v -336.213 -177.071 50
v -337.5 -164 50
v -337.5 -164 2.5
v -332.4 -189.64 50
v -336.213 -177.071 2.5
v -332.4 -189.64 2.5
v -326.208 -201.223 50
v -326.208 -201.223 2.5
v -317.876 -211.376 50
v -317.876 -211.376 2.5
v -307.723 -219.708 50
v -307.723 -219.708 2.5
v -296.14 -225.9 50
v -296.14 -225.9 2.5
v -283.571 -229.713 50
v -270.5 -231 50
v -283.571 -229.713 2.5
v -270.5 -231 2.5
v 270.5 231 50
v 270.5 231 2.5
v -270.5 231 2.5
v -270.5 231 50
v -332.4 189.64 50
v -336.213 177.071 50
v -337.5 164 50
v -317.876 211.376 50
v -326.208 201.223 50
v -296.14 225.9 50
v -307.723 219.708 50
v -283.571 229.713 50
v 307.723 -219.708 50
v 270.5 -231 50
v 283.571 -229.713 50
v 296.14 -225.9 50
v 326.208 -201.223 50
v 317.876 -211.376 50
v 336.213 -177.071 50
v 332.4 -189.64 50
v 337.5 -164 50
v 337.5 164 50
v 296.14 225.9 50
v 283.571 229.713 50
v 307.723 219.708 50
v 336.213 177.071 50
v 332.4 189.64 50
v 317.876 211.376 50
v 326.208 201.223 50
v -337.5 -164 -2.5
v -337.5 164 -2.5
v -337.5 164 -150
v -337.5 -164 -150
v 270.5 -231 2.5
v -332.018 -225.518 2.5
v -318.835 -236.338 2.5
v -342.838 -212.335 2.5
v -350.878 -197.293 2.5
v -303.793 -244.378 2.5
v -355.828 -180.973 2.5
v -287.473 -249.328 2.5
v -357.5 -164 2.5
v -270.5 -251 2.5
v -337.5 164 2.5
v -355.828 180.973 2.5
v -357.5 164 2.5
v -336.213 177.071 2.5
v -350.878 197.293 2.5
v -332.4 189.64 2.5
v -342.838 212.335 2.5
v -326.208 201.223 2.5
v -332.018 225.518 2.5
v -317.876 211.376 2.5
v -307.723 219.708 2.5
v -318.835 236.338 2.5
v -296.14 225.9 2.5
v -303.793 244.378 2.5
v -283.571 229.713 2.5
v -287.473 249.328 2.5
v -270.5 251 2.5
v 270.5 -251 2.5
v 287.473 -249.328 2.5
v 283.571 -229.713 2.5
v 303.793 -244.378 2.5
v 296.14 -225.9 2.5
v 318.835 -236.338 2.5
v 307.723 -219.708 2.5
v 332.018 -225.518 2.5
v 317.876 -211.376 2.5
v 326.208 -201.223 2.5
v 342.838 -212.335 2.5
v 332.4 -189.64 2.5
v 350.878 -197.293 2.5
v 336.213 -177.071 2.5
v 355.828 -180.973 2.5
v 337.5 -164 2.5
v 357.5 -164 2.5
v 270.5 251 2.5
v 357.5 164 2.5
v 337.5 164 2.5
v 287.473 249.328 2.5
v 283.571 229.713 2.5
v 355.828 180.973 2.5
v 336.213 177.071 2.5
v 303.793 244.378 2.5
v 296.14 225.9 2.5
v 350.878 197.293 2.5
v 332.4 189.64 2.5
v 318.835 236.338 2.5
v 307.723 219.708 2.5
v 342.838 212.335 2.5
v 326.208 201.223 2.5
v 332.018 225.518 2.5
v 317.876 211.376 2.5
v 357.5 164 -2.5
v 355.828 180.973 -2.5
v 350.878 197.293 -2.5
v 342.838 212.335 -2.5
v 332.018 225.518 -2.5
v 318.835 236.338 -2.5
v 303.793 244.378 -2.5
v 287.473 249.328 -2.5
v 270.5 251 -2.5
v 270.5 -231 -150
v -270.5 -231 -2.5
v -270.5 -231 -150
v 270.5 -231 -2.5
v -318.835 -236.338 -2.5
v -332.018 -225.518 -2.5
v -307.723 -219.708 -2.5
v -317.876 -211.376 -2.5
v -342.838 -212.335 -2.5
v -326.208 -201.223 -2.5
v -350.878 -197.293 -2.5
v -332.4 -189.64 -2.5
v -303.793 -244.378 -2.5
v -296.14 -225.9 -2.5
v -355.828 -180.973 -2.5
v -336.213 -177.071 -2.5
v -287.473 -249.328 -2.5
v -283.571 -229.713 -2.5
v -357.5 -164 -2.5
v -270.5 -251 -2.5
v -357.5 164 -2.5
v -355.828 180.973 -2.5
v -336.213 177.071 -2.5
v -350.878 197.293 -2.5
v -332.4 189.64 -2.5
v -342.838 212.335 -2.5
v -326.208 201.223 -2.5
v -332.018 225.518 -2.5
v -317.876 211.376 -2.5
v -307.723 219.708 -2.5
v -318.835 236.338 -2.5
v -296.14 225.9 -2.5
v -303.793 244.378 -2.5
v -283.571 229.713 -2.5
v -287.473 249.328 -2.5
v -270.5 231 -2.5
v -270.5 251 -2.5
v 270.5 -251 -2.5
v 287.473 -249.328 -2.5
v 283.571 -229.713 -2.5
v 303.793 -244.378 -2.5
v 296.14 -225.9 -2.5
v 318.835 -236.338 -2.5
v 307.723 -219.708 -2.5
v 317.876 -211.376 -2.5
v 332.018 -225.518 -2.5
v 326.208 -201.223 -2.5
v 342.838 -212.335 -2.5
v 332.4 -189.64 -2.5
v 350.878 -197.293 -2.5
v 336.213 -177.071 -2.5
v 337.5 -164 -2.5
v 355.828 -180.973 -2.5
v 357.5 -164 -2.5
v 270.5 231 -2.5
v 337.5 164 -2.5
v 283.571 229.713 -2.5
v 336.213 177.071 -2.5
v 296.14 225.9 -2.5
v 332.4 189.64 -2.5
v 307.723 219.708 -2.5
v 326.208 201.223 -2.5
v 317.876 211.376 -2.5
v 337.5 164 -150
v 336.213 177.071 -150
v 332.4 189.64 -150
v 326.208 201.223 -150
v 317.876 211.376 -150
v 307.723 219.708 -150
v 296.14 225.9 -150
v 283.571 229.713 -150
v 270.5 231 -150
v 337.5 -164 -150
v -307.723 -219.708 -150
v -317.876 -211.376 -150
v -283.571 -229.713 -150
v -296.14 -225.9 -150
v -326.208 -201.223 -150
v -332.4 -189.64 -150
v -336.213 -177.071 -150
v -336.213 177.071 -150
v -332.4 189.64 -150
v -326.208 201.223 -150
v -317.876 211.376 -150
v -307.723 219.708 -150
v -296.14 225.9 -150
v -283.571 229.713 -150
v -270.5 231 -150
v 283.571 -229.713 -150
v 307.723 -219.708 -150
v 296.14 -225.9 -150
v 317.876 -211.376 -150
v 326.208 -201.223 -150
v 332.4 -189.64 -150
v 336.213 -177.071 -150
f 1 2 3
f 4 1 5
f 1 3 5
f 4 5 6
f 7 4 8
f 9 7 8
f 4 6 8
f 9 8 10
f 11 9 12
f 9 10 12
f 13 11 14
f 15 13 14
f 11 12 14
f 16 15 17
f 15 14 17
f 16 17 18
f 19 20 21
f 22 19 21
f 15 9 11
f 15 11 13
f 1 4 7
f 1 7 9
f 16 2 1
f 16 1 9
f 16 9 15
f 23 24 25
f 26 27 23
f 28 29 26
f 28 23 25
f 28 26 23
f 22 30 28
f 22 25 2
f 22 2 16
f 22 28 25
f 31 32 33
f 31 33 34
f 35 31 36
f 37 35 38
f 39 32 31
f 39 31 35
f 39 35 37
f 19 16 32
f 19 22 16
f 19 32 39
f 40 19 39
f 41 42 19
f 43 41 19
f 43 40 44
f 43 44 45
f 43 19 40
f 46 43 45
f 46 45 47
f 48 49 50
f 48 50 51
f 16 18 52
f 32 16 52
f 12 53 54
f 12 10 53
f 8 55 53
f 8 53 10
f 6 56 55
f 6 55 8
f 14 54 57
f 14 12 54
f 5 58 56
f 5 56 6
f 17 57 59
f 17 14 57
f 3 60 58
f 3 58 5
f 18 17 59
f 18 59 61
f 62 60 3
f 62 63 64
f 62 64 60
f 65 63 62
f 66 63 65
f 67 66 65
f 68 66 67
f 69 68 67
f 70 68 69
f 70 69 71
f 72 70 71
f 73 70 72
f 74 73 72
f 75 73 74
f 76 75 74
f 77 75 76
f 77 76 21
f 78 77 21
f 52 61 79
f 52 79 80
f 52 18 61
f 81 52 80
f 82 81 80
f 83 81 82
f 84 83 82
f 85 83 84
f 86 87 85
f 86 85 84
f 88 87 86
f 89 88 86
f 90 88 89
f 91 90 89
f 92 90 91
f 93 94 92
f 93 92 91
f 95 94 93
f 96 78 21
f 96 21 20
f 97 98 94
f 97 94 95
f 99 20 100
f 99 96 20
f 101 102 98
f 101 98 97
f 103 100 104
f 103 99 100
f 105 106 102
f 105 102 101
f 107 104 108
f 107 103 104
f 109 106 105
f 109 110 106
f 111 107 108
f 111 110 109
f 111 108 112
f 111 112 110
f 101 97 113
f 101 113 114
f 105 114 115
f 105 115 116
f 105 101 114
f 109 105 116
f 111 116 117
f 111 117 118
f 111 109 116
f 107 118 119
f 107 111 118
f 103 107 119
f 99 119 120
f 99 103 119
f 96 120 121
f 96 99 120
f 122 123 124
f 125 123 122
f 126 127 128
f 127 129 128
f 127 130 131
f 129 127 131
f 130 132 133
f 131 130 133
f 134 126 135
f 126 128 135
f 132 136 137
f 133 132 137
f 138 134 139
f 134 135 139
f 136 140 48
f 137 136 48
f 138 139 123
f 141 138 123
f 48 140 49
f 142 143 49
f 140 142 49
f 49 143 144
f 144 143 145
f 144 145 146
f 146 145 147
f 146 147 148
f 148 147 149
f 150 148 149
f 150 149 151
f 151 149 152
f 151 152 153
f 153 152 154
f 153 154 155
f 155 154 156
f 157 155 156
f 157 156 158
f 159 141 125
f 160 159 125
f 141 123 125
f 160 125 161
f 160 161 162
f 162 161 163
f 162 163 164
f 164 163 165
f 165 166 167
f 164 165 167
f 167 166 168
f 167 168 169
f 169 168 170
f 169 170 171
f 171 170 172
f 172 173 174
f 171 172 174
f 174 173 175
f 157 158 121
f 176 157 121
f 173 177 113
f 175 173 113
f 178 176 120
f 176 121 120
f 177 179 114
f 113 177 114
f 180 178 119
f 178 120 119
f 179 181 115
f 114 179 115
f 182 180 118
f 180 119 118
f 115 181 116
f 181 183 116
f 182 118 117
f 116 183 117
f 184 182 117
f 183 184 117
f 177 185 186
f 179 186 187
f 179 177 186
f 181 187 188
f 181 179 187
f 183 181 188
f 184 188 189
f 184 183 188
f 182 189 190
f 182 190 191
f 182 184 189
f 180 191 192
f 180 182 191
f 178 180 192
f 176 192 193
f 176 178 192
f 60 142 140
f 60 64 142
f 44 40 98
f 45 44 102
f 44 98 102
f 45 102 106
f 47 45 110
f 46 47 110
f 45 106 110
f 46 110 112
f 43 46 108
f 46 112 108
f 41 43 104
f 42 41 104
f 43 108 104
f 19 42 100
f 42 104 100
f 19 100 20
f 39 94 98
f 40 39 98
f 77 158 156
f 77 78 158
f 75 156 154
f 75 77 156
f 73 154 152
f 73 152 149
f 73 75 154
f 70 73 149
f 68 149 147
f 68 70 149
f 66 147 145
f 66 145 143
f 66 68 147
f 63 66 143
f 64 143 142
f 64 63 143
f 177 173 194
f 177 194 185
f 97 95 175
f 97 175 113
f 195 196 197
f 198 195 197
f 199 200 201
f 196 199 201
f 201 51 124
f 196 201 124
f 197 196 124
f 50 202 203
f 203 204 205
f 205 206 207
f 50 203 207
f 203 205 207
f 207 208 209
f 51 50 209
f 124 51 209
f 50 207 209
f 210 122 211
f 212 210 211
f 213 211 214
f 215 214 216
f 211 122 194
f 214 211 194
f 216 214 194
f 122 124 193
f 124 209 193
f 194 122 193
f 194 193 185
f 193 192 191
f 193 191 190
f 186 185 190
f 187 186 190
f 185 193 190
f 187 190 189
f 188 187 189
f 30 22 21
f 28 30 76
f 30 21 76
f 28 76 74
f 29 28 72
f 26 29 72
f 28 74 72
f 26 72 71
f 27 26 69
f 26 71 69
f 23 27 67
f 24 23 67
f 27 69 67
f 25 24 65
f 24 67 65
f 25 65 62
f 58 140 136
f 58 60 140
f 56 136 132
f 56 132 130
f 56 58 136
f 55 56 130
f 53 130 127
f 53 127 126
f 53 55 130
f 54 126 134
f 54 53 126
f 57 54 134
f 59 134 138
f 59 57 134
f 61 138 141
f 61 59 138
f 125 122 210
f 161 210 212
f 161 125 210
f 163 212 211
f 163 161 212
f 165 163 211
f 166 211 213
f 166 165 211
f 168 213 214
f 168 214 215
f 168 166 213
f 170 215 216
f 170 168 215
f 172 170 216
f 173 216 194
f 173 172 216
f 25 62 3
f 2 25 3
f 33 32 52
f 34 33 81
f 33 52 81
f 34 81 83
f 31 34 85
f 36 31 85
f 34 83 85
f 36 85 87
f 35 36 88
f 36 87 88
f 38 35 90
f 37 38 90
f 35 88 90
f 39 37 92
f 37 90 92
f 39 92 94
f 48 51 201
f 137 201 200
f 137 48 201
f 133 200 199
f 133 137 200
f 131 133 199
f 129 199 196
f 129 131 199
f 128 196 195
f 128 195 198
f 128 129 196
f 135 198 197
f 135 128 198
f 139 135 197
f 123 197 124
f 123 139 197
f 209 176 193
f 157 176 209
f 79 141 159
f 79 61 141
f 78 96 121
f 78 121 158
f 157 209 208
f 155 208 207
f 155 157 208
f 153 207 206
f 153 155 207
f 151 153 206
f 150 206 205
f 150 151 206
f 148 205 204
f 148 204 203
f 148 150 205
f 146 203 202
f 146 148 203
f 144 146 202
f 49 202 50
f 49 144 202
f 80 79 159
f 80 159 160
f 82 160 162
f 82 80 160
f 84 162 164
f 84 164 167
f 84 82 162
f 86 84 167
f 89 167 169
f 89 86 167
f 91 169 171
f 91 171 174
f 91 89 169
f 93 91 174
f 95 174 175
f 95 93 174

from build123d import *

# Parameters (mm, degrees)
F1_DEPTH = 2.5
F2_DEPTH = 50
F3_DEPTH = 150


with BuildPart() as f1:
    # F0 (on Top) → F1 (new body, symmetric)
    with BuildSketch(Plane.XY):
        with BuildLine():
            Line((-270.5, -251), (270.5, -251))
            ThreePointArc((270.5, -251), (332.01829, -225.51829), (357.5, -164))
            Line((357.5, -164), (357.5, 164))
            ThreePointArc((357.5, 164), (332.01829, 225.51829), (270.5, 251))
            Line((270.5, 251), (-270.5, 251))
            ThreePointArc((-270.5, 251), (-332.01829, 225.51829), (-357.5, 164))
            Line((-357.5, 164), (-357.5, -164))
            ThreePointArc((-357.5, -164), (-332.01829, -225.51829), (-270.5, -251))
        make_face()
        with BuildLine():
            ThreePointArc((337.5, -164), (317.876154, -211.376154), (270.5, -231))
            Line((270.5, -231), (-270.5, -231))
            ThreePointArc((-270.5, -231), (-317.876154, -211.376154), (-337.5, -164))
            Line((-337.5, -164), (-337.5, 164))
            ThreePointArc((-337.5, 164), (-317.876154, 211.376154), (-270.5, 231))
            Line((-270.5, 231), (270.5, 231))
            ThreePointArc((270.5, 231), (317.876154, 211.376154), (337.5, 164))
            Line((337.5, 164), (337.5, -164))
        make_face(mode=Mode.SUBTRACT)
    extrude(amount=F1_DEPTH, both=True)

    # F0 (on Top) → F2 (join)
    with BuildSketch(Plane.XY):
        with BuildLine():
            Line((-270.5, -231), (270.5, -231))
            ThreePointArc((270.5, -231), (317.876154, -211.376154), (337.5, -164))
            Line((337.5, -164), (337.5, 164))
            ThreePointArc((337.5, 164), (317.876154, 211.376154), (270.5, 231))
            Line((270.5, 231), (-270.5, 231))
            ThreePointArc((-270.5, 231), (-317.876154, 211.376154), (-337.5, 164))
            Line((-337.5, 164), (-337.5, -164))
            ThreePointArc((-337.5, -164), (-317.876154, -211.376154), (-270.5, -231))
        make_face()
    extrude(amount=F2_DEPTH)

    # F0 (on Top) → F3 (join)
    with BuildSketch(Plane.XY):
        with BuildLine():
            Line((-270.5, -231), (270.5, -231))
            ThreePointArc((270.5, -231), (317.876154, -211.376154), (337.5, -164))
            Line((337.5, -164), (337.5, 164))
            ThreePointArc((337.5, 164), (317.876154, 211.376154), (270.5, 231))
            Line((270.5, 231), (-270.5, 231))
            ThreePointArc((-270.5, 231), (-317.876154, 211.376154), (-337.5, 164))
            Line((-337.5, 164), (-337.5, -164))
            ThreePointArc((-337.5, -164), (-317.876154, -211.376154), (-270.5, -231))
        make_face()
    extrude(amount=-F3_DEPTH)


solid = f1.part
